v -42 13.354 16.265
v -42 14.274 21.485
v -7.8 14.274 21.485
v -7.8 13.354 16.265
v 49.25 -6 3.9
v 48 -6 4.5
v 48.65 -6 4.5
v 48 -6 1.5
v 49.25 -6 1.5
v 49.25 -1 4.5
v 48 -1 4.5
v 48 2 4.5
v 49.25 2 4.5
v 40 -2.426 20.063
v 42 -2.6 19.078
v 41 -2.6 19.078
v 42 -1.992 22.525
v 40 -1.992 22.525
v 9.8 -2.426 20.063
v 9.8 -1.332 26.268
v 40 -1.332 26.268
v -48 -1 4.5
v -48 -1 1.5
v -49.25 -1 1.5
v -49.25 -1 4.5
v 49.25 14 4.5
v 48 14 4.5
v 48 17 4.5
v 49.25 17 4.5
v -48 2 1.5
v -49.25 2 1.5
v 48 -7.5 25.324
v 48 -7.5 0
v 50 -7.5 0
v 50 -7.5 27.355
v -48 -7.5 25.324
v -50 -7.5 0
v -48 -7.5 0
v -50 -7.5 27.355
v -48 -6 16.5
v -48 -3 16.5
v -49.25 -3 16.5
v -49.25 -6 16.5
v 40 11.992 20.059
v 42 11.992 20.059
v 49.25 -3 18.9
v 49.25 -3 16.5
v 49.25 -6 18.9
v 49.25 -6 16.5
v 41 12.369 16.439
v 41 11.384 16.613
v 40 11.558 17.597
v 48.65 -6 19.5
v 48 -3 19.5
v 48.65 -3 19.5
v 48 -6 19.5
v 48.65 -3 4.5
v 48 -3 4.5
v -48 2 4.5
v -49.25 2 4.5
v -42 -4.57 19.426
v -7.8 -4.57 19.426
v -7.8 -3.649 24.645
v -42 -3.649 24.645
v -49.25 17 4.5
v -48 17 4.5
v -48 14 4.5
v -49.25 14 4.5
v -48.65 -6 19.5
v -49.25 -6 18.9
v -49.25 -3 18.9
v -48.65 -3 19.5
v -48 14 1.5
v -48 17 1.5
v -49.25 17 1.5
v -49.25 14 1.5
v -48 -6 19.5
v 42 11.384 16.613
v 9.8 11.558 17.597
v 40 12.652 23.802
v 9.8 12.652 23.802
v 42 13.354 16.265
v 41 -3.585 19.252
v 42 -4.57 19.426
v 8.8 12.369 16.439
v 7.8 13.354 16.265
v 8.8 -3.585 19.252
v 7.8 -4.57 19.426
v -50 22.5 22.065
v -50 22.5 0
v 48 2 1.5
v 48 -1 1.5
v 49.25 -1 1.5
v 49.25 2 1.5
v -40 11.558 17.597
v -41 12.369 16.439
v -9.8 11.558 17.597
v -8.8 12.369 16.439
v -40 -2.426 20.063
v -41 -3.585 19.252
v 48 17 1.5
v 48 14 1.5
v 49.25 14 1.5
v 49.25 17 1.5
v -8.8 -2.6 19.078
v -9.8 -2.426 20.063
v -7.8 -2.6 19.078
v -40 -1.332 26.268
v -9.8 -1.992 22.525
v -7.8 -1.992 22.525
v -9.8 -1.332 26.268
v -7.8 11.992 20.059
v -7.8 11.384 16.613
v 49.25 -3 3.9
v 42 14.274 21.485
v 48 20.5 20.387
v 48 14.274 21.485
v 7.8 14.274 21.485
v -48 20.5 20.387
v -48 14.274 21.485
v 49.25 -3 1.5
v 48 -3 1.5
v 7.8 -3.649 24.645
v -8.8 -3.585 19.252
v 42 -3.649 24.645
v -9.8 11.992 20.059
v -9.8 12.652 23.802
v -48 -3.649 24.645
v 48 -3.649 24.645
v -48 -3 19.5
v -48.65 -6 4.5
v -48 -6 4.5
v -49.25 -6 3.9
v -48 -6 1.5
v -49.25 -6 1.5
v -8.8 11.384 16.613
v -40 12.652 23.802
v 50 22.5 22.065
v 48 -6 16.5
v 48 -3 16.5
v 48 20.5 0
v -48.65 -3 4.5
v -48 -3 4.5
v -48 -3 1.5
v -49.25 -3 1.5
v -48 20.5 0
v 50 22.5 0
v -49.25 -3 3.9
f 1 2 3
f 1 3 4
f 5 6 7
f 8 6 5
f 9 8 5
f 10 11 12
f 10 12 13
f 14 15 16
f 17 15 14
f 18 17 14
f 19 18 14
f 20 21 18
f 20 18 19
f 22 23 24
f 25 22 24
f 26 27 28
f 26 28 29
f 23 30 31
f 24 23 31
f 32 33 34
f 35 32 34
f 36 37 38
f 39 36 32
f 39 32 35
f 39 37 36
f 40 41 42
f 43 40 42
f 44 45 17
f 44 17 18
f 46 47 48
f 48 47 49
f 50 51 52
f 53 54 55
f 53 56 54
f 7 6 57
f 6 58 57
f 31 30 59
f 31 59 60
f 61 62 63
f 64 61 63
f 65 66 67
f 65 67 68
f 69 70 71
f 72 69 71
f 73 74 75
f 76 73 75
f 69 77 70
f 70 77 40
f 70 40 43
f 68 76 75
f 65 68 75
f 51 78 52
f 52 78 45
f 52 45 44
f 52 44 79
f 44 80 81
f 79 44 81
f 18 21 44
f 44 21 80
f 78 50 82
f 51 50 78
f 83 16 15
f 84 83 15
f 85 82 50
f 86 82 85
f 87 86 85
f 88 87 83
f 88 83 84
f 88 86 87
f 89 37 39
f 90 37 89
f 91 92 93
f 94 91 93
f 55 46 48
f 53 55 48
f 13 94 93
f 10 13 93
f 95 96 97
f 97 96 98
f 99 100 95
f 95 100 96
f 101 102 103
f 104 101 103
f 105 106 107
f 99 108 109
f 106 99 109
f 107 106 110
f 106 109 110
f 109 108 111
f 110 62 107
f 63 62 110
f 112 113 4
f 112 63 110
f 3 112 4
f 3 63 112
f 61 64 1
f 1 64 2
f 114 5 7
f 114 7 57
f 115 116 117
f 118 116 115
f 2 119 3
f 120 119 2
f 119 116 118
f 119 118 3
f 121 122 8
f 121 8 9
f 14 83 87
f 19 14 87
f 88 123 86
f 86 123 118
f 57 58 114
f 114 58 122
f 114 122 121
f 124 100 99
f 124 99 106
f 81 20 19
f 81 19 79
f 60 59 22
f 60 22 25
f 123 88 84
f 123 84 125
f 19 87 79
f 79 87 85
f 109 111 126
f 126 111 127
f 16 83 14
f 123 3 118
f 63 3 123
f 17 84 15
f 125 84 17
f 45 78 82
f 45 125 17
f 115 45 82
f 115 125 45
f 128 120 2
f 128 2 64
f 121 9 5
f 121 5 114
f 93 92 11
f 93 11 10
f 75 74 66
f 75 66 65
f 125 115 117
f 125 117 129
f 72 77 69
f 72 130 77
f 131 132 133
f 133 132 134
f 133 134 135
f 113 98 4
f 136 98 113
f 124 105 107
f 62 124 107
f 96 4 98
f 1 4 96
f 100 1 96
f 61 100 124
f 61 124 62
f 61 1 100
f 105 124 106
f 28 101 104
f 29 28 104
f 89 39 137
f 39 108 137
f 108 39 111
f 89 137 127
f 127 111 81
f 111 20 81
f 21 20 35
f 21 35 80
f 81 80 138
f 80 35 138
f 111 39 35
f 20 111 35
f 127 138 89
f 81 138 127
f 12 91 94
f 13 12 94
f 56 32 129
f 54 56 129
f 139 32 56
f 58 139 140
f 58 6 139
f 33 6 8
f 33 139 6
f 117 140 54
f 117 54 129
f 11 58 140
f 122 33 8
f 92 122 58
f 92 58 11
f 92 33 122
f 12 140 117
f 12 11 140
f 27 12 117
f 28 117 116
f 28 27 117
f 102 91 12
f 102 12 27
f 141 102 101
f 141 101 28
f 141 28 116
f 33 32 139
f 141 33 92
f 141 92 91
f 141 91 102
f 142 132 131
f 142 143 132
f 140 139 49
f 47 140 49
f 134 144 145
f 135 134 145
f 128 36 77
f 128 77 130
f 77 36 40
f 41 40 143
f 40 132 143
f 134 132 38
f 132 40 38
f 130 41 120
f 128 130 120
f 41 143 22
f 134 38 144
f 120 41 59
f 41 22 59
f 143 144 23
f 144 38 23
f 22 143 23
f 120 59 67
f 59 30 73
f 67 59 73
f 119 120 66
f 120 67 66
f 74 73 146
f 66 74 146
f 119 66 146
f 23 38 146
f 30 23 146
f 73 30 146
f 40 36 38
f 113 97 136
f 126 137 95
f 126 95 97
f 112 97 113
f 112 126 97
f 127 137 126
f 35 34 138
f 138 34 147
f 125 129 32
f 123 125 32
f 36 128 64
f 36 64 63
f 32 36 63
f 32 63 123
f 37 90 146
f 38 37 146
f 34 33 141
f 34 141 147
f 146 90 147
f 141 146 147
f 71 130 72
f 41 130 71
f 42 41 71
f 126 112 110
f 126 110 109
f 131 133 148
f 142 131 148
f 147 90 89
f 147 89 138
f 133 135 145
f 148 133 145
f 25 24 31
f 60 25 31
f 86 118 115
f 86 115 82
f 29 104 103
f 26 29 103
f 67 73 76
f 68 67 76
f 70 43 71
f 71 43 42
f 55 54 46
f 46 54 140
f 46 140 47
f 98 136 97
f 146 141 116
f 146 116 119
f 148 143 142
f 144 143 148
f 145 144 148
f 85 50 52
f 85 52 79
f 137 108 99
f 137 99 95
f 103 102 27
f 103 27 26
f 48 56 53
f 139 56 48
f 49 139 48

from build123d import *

# Parameters (mm, degrees)
SKETCH1_W               = 100
SKETCH1_H               = 45
BOSS_EXTRUDE1_DEPTH     = 30
CUT_EXTRUDE5_DEPTH      = 107.800046816
SKETCH2_W               = 30.2
SKETCH2_H               = 14.2
CUT_EXTRUDE1_DEPTH      = 61.848905169
CUT_EXTRUDE6_REACH      = 64.5
SKETCH9_W               = 96
SKETCH9_H               = 41
SHELL2_START            = -48
SHELL2_DEPTH            = 96
SHELL2_START_2          = -7.8
SHELL2_2_DEPTH          = 15.6
SHELL2_3_DEPTH          = 6
SHELL2_START_3          = 42
SHELL2_4_DEPTH          = 6
SKETCH10_W              = 96
SKETCH10_H              = 2
CUT_EXTRUDE7_DEPTH      = 2
CUT_EXTRUDE9_START      = -1.5
SKETCH12_W              = 1.25
SKETCH12_H              = 3
CUT_EXTRUDE9_DEPTH      = 3
LPATTERN2_COUNT         = 2
LPATTERN2_PITCH         = 15
LPATTERN3_COUNT         = 2
LPATTERN3_PITCH         = 5
LPATTERN4_COUNT         = 2
LPATTERN4_PITCH         = 20
MIRROR7_START           = -1.5
MIRROR7_COPY_1_SKETCH_W = 1.25
MIRROR7_COPY_1_SKETCH_H = 3
MIRROR7_COPY_1_DEPTH    = 3
MIRROR7_COPY_2_SKETCH_W = 1.25
MIRROR7_COPY_2_SKETCH_H = 3
MIRROR7_COPY_2_DEPTH    = 3
MIRROR7_COPY_3_SKETCH_W = 1.25
MIRROR7_COPY_3_SKETCH_H = 3
MIRROR7_COPY_3_DEPTH    = 3
CHAMFER4_SIZE           = 1
SKETCH13_W              = 30
SKETCH13_H              = 15
CUT_EXTRUDE10_DEPTH     = 107.800046816
CHAMFER5_SIZE           = 0.6
SKETCH14_W              = 2
SKETCH14_H              = 14.2
CUT_EXTRUDE11_DEPTH     = 3.5


# Read off the part's stored shape, not the designer's step: Shell2
with BuildPart() as part:
    # Sketch1 → Boss-Extrude1 (new body)
    with BuildSketch(Plane.XY):
        Rectangle(SKETCH1_W, SKETCH1_H)
    extrude(amount=BOSS_EXTRUDE1_DEPTH)

    # Sketch7 → Cut-Extrude5 (cut, through all)
    with BuildSketch(Plane(origin=(50, 0, 0), x_dir=(0, 0, -1), z_dir=(1, 0, 0))):
        Polygon((-30, -22.5), (-22.065285868, 22.5), (-30, 22.5), align=None)
    extrude(amount=-CUT_EXTRUDE5_DEPTH, mode=Mode.SUBTRACT)

    # Sketch2 → Cut-Extrude1 (cut, through all)
    with BuildSketch(Plane(origin=(0, -0.341825557, 26.092916002), x_dir=(1, 0, 0), z_dir=(0, 0.17364817766692325, 0.9848077530122092))):
        with Locations((-24.9, 6.094197535)):
            Rectangle(SKETCH2_W, SKETCH2_H)
    cut_extrude1 = extrude(amount=-CUT_EXTRUDE1_DEPTH, mode=Mode.SUBTRACT)

    # Mirror1: Cut-Extrude1 across plane
    add(cut_extrude1.mirror(Plane(origin=(0, 0, 0), x_dir=(0, 0, 1), z_dir=(1, 0, 0))), mode=Mode.SUBTRACT)

    # Cut-Extrude6: up to this plane
    cut_extrude6_end = Plane(origin=(-50, -23.767631697, 22.810903403), z_dir=(0, -0.17364817766692328, -0.9848077530122092))
    # Sketch9 → Cut-Extrude6 (cut, up to the surface)
    with BuildSketch(Plane(origin=(0, 0, 0), x_dir=(-1, 0, 0), z_dir=(0, 0, -1)), mode=Mode.PRIVATE) as cut_extrude6_sk1:
        Rectangle(SKETCH9_W, SKETCH9_H)
    cut_extrude6_tool1 = split(extrude(cut_extrude6_sk1.sketch, amount=-CUT_EXTRUDE6_REACH, mode=Mode.PRIVATE), bisect_by=cut_extrude6_end, keep=Keep.BOTH, mode=Mode.PRIVATE)
    add(cut_extrude6_tool1.solids().sort_by_distance((0, 0, 0))[0], mode=Mode.SUBTRACT)

    # Shell2 outline → Shell2 (cut)
    with BuildSketch(Plane.YZ.offset(SHELL2_START)):
        Polygon((13.353906279, 16.265374693), (20.5, 15.005325563), (20.5, 20.387086606), (14.274241621, 21.484855784), align=None)
        Polygon((-20.5, 22.234731772), (-4.569594826, 19.425771526), (-3.649259484, 24.645252617), (-22.5, 27.969146776), (-22.5, 2), (-20.5, 2), align=None)
    extrude(amount=SHELL2_DEPTH, mode=Mode.SUBTRACT)

    # Shell2 2 outline → Shell2 2 (cut)
    with BuildSketch(Plane.YZ.offset(SHELL2_START_2)):
        Polygon((-4.569594826, 19.425771526), (13.353906279, 16.265374693), (14.274241621, 21.484855783), (-3.649259484, 24.645252617), align=None)
    extrude(amount=SHELL2_2_DEPTH, mode=Mode.SUBTRACT)

    # Shell2 3 outline → Shell2 3 (cut)
    with BuildSketch(Plane.YZ.offset(SHELL2_START)):
        Polygon((-4.569594826, 19.425771526), (13.353906279, 16.265374693), (14.274241621, 21.484855783), (-3.649259484, 24.645252617), align=None)
    extrude(amount=SHELL2_3_DEPTH, mode=Mode.SUBTRACT)

    # Shell2 4 outline → Shell2 4 (cut)
    with BuildSketch(Plane.YZ.offset(SHELL2_START_3)):
        Polygon((-4.569594826, 19.425771526), (13.353906279, 16.265374693), (14.274241621, 21.484855783), (-3.649259484, 24.645252617), align=None)
    extrude(amount=SHELL2_4_DEPTH, mode=Mode.SUBTRACT)

    # Sketch10 → Cut-Extrude7 (cut)
    with BuildSketch(Plane(origin=(0, 0, 0), x_dir=(-1, 0, 0), z_dir=(0, 0, -1))):
        with Locations((0, -21.5)):
            Rectangle(SKETCH10_W, SKETCH10_H)
    extrude(amount=-CUT_EXTRUDE7_DEPTH, mode=Mode.SUBTRACT)

    # Sketch12 → Cut-Extrude9 (cut)
    with BuildSketch(Plane(origin=(0, 0, 0), x_dir=(-1, 0, 0), z_dir=(0, 0, -1)).offset(CUT_EXTRUDE9_START)):
        with Locations((48.625, -4.5)):
            Rectangle(SKETCH12_W, SKETCH12_H)
    cut_extrude9 = extrude(amount=-CUT_EXTRUDE9_DEPTH, mode=Mode.SUBTRACT)

    # LPattern2: Cut-Extrude9 ×2
    with Locations(*[(0, 0, i * LPATTERN2_PITCH) for i in range(1, LPATTERN2_COUNT)]):
        add(cut_extrude9, mode=Mode.SUBTRACT)

    # LPattern3: Cut-Extrude9 ×2
    with Locations(*[(0, i * LPATTERN3_PITCH, 0) for i in range(1, LPATTERN3_COUNT)]):
        add(cut_extrude9, mode=Mode.SUBTRACT)

    # LPattern4: Cut-Extrude9 ×2
    with Locations(*[(0, i * LPATTERN4_PITCH, 0) for i in range(1, LPATTERN4_COUNT)]):
        add(cut_extrude9, mode=Mode.SUBTRACT)

    # Mirror7: Cut-Extrude9 across plane
    add(cut_extrude9.mirror(Plane(origin=(0, 0, 0), x_dir=(0, 0, 1), z_dir=(1, 0, 0))), mode=Mode.SUBTRACT)

    # Mirror7 copy 1 sketch → Mirror7 copy 1 (cut)
    with BuildSketch(Plane(origin=(0, 0, 15), x_dir=(1, 0, 0), z_dir=(0, 0, -1)).offset(MIRROR7_START)):
        with Locations((48.625, 4.5)):
            Rectangle(MIRROR7_COPY_1_SKETCH_W, MIRROR7_COPY_1_SKETCH_H)
    extrude(amount=-MIRROR7_COPY_1_DEPTH, mode=Mode.SUBTRACT)

    # Mirror7 copy 2 sketch → Mirror7 copy 2 (cut)
    with BuildSketch(Plane(origin=(0, 5, 0), x_dir=(1, 0, 0), z_dir=(0, 0, -1)).offset(MIRROR7_START)):
        with Locations((48.625, 4.5)):
            Rectangle(MIRROR7_COPY_2_SKETCH_W, MIRROR7_COPY_2_SKETCH_H)
    extrude(amount=-MIRROR7_COPY_2_DEPTH, mode=Mode.SUBTRACT)

    # Mirror7 copy 3 sketch → Mirror7 copy 3 (cut)
    with BuildSketch(Plane(origin=(0, 20, 0), x_dir=(1, 0, 0), z_dir=(0, 0, -1)).offset(MIRROR7_START)):
        with Locations((48.625, 4.5)):
            Rectangle(MIRROR7_COPY_3_SKETCH_W, MIRROR7_COPY_3_SKETCH_H)
    extrude(amount=-MIRROR7_COPY_3_DEPTH, mode=Mode.SUBTRACT)

    # Chamfer4
    chamfer4_edges = [part.edges().sort_by_distance(p)[0] for p in [
        (24.9, -2.59997932, 19.078475171),
        (9.8, 4.392155727, 17.845573109),
        (24.9, 11.384290773, 16.612671048),
        (40, 4.392155727, 17.845573109),
        (-24.9, -2.59997932, 19.078475171),
        (-9.8, 4.392155727, 17.845573109),
        (-24.9, 11.384290773, 16.612671048),
        (-40, 4.392155727, 17.845573109),
    ]]
    chamfer(chamfer4_edges, length=CHAMFER4_SIZE)

    # Sketch13 → Cut-Extrude10 (cut, through all)
    with BuildSketch(Plane.ZY.offset(50)):
        with Locations((15, -15)):
            Rectangle(SKETCH13_W, SKETCH13_H)
    extrude(amount=-CUT_EXTRUDE10_DEPTH, mode=Mode.SUBTRACT)

    # Chamfer5
    chamfer5_edges = [part.edges().sort_by_distance(p)[0] for p in [
        (-49.25, -4.5, 4.5),
        (-49.25, -4.5, 19.5),
        (49.25, -4.5, 4.5),
        (49.25, -4.5, 19.5),
    ]]
    chamfer(chamfer5_edges, length=CHAMFER5_SIZE)

    # Sketch14 → Cut-Extrude11 (cut)
    with BuildSketch(Plane(origin=(0, 3.184212437, 18.058566102), x_dir=(-1, 0, 0), z_dir=(0, -0.17364817766692328, -0.9848077530122094))):
        with Locations((8.8, 1.226577762)):
            Rectangle(SKETCH14_W, SKETCH14_H)
        with Locations((-41, 1.226577762)):
            Rectangle(SKETCH14_W, SKETCH14_H)
    extrude(amount=-CUT_EXTRUDE11_DEPTH, mode=Mode.SUBTRACT)


solid = part.part
